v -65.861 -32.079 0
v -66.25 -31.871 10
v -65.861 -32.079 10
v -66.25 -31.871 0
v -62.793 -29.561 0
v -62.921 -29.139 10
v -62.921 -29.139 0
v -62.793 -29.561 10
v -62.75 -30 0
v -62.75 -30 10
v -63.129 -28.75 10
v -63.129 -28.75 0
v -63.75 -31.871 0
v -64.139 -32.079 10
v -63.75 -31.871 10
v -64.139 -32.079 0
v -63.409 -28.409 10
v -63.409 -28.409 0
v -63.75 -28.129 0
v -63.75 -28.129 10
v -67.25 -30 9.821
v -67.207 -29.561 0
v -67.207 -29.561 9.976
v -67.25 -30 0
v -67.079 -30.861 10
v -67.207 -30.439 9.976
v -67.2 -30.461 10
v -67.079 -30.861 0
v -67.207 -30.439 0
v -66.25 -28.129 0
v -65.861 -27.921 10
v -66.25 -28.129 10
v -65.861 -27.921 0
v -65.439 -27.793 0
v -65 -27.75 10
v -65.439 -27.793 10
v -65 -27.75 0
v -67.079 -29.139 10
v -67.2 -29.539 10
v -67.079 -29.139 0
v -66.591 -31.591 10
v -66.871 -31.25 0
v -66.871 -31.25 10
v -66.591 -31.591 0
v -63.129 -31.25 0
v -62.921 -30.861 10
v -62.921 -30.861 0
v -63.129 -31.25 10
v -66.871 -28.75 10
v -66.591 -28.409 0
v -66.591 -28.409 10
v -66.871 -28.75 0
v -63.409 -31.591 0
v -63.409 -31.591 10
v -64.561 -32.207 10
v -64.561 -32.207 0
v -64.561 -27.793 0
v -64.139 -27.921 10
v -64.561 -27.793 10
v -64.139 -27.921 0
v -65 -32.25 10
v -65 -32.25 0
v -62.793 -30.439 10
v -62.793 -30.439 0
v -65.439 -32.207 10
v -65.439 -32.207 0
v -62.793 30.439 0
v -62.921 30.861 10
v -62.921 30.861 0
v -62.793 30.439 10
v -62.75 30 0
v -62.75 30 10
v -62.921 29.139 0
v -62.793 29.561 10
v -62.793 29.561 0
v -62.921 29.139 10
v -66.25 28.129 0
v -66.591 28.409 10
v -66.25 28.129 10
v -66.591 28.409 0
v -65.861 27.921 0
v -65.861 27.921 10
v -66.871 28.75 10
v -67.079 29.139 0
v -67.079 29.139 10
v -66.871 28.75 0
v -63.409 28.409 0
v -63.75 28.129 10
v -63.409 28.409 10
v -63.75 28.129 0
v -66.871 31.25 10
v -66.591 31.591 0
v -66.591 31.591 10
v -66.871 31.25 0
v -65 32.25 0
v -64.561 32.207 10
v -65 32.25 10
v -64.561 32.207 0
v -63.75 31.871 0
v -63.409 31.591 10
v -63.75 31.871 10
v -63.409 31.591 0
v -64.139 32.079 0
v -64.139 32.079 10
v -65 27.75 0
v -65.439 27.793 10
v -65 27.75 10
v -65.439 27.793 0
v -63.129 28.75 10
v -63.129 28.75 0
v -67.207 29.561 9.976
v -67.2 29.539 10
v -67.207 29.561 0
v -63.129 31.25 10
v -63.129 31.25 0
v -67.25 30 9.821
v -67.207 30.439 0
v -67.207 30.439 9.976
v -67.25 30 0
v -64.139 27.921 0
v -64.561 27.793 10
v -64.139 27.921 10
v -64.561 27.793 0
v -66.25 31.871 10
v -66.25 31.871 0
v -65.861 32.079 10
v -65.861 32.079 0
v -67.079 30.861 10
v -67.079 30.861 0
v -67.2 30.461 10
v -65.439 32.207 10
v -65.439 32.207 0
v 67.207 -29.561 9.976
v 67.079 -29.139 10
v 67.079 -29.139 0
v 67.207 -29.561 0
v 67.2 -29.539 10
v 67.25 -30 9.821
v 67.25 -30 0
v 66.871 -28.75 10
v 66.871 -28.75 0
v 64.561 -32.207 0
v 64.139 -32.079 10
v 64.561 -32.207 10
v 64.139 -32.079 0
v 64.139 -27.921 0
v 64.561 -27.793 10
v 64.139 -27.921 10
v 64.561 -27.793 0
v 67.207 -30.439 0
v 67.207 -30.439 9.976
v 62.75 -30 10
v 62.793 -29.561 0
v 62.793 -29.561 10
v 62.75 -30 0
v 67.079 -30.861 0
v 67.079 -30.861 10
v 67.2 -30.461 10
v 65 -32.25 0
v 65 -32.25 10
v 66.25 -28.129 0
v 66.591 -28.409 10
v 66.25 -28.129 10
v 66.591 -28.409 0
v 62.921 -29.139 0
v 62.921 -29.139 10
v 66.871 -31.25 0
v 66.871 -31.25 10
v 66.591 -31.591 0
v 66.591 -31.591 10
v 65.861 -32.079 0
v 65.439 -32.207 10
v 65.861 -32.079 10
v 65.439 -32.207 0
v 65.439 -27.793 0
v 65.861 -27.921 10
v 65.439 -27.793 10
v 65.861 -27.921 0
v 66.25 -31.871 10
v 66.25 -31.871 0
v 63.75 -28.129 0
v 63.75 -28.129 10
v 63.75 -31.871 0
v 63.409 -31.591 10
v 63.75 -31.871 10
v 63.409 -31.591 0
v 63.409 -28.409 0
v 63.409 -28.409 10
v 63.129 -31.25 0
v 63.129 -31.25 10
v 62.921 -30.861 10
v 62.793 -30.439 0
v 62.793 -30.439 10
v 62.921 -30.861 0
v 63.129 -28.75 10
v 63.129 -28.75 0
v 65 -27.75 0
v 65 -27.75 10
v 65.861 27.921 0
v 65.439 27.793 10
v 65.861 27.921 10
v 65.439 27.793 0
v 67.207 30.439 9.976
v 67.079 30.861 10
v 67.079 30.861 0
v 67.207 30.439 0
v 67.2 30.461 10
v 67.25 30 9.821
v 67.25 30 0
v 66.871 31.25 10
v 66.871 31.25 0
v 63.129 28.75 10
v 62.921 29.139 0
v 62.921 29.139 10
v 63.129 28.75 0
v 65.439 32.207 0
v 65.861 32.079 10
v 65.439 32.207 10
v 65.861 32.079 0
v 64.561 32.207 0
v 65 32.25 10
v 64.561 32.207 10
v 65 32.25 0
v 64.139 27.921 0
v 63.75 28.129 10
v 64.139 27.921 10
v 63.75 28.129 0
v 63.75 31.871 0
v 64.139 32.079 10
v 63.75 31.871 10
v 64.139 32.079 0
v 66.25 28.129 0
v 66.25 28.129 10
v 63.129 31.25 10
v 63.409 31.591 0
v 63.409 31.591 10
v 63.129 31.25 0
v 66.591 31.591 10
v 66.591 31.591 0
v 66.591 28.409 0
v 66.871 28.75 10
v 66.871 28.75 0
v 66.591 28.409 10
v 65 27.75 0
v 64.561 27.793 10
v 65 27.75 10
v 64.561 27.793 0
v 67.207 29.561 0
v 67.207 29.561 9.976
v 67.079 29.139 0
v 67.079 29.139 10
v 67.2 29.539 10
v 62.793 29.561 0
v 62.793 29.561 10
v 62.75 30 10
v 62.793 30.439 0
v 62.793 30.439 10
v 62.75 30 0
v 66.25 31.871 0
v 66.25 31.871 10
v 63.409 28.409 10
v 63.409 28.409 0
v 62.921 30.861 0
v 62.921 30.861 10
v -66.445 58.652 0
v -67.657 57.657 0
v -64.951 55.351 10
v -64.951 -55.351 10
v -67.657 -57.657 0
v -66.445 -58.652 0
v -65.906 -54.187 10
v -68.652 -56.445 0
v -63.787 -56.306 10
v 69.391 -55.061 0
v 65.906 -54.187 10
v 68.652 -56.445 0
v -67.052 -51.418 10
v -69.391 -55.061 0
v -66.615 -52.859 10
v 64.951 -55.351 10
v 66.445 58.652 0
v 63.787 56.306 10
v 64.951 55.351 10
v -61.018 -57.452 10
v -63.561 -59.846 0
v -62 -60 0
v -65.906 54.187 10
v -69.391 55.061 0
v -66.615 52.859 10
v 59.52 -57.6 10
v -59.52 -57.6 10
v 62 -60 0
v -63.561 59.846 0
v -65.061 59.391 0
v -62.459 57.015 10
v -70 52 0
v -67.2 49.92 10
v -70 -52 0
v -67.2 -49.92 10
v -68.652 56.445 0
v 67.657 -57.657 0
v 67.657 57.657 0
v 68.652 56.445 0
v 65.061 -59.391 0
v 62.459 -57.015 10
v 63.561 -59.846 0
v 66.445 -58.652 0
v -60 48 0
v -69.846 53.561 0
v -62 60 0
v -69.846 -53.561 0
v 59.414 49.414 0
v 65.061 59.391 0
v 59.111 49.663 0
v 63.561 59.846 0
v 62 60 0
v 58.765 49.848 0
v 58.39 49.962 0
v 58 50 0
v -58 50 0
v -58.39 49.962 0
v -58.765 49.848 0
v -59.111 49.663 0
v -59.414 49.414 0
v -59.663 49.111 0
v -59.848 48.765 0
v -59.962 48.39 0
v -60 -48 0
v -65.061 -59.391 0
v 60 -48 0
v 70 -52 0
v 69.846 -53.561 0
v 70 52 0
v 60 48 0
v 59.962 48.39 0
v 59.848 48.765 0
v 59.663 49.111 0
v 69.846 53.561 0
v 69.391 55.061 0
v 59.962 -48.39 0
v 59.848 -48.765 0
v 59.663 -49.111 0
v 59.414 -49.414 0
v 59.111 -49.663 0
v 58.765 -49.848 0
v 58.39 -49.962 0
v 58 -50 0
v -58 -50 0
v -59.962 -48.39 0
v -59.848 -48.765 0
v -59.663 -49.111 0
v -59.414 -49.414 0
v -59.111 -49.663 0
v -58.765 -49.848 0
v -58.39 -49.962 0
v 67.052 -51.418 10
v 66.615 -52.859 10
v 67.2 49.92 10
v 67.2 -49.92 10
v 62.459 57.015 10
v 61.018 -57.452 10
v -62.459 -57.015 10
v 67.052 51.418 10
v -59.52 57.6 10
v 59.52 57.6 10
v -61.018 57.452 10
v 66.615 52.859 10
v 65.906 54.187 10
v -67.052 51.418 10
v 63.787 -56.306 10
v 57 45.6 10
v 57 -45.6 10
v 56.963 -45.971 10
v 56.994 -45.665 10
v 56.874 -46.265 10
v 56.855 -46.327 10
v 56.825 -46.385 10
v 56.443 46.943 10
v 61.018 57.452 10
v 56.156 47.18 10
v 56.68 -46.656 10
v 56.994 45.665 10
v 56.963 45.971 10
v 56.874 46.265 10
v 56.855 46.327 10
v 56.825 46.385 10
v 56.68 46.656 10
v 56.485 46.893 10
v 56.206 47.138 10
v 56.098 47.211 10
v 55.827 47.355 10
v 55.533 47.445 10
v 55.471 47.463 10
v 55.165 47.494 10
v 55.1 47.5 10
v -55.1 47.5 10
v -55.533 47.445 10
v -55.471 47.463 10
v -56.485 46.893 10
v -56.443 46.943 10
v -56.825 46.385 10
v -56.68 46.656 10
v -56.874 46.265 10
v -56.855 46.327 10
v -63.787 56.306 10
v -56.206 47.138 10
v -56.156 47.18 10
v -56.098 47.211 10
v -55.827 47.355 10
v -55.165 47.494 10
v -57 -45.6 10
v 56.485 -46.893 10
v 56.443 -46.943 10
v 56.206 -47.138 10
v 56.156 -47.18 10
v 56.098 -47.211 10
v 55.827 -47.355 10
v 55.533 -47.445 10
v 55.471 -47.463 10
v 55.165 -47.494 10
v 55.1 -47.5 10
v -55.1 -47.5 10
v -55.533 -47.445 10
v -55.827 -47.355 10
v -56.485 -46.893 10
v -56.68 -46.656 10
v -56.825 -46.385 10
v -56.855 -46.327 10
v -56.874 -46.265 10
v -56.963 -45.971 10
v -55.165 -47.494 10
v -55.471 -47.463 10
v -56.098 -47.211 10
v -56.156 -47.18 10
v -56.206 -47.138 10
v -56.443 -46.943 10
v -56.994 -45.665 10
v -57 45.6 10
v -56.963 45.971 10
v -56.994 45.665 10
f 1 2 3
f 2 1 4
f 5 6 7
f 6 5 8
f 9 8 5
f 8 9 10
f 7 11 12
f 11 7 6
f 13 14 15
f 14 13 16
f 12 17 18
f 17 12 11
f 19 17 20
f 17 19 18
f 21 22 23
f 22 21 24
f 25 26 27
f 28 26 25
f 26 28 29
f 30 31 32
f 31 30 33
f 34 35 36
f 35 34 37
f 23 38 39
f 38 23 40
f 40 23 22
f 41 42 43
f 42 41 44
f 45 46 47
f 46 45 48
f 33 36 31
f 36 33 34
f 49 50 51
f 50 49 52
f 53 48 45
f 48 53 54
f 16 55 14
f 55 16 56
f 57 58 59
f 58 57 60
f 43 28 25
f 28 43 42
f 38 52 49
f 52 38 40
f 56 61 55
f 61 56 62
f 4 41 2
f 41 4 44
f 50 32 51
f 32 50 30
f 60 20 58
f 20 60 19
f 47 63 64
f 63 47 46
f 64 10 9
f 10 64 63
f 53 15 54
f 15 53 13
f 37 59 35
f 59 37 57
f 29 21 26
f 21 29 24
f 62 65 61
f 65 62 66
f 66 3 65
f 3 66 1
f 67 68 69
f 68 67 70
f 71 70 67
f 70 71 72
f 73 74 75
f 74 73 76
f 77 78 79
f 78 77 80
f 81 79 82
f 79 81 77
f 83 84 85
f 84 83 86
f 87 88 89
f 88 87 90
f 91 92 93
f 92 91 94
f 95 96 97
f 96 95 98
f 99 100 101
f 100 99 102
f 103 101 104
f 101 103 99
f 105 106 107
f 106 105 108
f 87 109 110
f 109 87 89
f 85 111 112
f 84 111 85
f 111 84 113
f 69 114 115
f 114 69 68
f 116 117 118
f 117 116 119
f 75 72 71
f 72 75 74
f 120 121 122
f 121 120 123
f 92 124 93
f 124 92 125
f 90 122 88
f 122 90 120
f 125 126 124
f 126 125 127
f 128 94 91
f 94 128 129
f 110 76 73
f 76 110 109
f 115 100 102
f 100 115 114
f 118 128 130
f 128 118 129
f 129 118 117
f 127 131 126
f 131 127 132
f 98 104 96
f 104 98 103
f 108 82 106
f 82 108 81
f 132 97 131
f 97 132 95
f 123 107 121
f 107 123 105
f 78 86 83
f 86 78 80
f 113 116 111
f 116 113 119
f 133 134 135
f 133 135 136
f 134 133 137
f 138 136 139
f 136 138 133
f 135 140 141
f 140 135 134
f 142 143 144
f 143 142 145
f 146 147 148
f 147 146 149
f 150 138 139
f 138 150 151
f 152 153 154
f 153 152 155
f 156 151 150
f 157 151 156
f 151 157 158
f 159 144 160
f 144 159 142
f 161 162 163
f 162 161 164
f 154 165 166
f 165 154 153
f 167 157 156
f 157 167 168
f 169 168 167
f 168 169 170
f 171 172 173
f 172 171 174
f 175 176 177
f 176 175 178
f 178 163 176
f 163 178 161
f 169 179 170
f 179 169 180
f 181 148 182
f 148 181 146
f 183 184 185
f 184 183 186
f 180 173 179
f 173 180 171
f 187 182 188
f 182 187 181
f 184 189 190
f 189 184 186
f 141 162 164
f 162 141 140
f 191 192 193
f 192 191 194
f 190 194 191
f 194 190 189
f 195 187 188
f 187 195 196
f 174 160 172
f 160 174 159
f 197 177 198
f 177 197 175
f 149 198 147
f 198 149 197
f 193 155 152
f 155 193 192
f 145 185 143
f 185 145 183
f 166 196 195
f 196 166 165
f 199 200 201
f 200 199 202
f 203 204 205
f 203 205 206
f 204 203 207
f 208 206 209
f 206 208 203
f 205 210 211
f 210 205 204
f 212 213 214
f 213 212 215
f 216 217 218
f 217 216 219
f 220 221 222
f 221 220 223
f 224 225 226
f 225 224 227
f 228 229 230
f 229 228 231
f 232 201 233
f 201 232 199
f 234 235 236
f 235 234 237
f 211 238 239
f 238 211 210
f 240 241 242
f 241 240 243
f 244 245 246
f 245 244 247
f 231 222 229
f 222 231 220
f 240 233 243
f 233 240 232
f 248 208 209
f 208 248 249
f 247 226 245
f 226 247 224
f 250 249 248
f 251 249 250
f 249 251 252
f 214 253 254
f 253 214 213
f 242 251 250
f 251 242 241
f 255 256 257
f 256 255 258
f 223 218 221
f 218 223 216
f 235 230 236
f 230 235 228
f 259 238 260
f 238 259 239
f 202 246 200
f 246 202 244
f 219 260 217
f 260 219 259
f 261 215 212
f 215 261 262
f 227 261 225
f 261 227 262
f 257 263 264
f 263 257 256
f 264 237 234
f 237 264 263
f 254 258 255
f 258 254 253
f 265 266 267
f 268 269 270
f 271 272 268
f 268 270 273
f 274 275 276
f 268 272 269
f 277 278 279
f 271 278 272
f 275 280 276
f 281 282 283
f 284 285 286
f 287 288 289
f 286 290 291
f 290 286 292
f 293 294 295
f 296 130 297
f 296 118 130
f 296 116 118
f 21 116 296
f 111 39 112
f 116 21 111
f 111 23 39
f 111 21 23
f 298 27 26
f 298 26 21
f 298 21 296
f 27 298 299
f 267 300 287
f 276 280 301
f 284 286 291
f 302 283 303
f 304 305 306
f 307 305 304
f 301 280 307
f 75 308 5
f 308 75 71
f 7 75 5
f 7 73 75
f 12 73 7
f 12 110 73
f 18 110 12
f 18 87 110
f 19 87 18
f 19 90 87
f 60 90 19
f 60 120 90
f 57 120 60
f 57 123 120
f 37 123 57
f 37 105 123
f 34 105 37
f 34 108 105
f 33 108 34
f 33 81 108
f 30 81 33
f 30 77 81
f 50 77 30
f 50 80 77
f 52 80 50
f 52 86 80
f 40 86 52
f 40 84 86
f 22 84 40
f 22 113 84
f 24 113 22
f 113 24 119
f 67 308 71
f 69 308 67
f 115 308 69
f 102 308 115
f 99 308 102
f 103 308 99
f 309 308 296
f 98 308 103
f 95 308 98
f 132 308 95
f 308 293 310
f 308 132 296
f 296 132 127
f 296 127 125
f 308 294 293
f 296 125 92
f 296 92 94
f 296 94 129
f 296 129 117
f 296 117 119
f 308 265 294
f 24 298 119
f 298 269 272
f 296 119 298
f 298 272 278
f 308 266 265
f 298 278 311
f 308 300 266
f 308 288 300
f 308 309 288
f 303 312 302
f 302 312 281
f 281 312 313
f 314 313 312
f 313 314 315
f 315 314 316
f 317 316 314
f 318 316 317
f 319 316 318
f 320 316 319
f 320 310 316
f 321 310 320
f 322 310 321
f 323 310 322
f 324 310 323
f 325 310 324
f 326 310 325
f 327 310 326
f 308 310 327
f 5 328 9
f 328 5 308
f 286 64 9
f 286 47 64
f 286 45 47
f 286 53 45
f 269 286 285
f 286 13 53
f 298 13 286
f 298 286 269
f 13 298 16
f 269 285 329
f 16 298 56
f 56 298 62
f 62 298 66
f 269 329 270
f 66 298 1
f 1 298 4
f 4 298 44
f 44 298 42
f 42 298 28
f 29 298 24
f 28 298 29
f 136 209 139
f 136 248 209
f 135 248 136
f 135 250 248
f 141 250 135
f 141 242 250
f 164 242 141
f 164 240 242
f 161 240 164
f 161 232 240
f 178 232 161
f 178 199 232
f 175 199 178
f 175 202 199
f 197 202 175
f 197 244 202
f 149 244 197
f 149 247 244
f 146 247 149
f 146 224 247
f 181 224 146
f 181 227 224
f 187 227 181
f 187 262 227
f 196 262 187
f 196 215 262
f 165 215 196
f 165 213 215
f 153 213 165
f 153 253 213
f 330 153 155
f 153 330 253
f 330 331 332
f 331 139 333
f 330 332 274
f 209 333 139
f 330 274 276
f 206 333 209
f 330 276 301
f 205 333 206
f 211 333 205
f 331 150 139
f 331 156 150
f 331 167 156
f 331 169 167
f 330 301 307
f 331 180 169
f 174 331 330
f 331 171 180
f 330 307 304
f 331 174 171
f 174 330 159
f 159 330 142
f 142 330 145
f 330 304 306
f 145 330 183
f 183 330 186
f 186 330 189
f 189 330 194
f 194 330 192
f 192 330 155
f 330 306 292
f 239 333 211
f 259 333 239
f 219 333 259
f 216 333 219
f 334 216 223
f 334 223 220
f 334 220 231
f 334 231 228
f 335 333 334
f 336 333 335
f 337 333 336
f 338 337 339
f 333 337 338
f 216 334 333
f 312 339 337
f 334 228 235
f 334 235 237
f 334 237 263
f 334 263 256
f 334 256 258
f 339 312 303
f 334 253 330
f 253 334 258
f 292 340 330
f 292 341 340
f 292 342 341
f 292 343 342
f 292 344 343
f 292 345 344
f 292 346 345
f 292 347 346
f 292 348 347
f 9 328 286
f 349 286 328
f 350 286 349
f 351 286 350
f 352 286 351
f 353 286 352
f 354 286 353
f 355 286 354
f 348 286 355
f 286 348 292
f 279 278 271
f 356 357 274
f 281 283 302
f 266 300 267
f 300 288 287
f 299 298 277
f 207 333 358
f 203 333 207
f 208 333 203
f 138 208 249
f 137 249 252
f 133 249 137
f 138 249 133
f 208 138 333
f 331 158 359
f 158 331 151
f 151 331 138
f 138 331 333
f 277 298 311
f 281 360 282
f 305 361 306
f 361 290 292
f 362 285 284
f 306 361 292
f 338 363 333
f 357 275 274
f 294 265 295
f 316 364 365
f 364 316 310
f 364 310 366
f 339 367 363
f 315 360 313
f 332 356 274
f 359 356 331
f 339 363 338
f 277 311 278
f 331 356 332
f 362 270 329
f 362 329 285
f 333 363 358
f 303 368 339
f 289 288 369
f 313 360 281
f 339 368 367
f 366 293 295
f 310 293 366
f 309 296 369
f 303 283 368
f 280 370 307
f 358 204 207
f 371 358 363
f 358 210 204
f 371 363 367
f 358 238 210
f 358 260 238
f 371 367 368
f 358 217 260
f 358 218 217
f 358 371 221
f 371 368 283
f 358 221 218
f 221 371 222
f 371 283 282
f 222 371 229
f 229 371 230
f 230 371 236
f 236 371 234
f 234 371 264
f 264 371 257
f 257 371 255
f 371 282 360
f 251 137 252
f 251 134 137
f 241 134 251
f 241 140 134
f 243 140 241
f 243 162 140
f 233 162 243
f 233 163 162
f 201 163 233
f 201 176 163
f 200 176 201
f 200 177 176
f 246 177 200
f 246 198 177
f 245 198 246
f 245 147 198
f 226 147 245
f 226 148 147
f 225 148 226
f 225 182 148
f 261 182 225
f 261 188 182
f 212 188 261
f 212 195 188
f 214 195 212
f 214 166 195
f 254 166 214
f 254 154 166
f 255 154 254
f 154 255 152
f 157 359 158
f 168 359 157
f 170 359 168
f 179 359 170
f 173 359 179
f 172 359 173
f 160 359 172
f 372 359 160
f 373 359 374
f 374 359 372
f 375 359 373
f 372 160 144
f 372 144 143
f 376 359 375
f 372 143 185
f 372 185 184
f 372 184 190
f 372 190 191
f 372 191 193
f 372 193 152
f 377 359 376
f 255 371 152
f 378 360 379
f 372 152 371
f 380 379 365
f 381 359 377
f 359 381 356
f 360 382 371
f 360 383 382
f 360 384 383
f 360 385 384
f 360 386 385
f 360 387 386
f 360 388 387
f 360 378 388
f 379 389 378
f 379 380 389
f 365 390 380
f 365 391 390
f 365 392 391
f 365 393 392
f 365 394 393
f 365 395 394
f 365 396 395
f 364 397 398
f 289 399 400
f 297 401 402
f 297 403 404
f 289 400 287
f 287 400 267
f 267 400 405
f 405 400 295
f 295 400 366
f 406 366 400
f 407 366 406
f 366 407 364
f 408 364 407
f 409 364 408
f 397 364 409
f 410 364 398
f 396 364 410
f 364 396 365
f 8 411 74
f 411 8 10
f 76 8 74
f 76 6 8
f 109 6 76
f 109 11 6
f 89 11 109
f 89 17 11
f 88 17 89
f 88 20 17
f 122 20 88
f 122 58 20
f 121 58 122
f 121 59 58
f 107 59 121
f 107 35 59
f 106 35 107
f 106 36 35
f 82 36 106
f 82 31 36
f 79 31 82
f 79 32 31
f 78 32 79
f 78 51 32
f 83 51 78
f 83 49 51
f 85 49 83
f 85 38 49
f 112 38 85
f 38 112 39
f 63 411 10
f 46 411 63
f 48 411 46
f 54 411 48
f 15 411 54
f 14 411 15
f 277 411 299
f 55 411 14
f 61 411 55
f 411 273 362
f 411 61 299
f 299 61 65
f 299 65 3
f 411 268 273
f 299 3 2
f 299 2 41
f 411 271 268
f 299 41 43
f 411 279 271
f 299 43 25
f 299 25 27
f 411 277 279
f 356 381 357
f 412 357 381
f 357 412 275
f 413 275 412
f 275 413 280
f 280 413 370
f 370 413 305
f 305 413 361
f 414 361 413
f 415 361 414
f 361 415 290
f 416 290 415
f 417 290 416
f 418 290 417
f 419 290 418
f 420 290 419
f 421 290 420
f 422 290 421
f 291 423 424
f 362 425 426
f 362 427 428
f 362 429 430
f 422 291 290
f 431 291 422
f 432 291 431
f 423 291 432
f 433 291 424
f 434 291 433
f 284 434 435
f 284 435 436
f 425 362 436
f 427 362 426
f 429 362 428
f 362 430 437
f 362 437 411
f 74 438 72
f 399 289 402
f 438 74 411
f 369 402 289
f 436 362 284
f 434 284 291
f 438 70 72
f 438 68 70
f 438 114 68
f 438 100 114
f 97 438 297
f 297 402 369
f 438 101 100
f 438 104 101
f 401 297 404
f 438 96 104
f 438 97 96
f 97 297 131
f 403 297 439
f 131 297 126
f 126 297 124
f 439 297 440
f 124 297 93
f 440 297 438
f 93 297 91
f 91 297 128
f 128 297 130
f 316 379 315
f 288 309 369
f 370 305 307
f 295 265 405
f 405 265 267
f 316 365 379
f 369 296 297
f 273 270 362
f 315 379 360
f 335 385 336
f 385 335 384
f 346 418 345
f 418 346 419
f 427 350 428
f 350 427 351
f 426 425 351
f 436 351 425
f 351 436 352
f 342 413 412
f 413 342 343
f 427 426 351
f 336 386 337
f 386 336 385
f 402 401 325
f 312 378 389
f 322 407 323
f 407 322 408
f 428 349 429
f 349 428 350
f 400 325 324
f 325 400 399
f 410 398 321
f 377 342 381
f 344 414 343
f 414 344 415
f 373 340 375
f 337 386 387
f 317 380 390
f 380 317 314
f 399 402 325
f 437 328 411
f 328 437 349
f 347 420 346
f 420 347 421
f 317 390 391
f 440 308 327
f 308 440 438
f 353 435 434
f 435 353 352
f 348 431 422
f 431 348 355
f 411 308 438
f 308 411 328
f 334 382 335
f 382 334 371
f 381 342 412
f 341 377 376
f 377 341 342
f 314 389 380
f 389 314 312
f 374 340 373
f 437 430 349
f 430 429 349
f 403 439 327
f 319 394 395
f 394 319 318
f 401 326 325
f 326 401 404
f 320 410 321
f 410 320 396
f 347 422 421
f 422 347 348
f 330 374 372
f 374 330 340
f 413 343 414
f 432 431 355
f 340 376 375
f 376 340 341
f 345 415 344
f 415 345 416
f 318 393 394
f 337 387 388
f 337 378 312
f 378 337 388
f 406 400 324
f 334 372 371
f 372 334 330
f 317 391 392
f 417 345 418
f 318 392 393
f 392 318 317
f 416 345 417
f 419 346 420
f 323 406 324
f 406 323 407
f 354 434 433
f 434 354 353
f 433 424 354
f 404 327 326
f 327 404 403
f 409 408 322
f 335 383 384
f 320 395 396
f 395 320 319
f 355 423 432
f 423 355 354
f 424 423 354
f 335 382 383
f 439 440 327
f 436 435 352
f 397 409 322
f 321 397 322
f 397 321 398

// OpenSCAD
$fn = 32;

// ----------------------------------------------------------------------
// Display bezel: 140 x 120 mm frame, opening 120x100 mm
// ----------------------------------------------------------------------

// --- parameters (mm) ---
length = 140;             // frame outside length, X
width = 120;              // frame outside width, Y
frame_w = 10;             // frame width
thickness = 10;           // frame thickness
corner_r = 8;             // outside corner radius
chamfer = 0.96;           // outer wall taper
funnel = 0.94;            // inner opening taper
opening_l = 120;          // opening length
opening_w = 100;          // opening width
inner_r = 2;              // opening corner radius
hole_d = 4.5;             // mounting screw clearance
holes_per_side = 2;       // holes per short side
hole_inset = 5;           // hole centre inset from the outside edge

/* rounded-rectangle outlines, generated with loops */
module rounded_ring(l_nom, w_nom, r) {
  hull() {
    for (sx = [-1, 1]) for (sy = [-1, 1])
      translate([sx * (l_nom / 2 - r), sy * (w_nom / 2 - r)]) circle(r = r);
  }
}

difference() {
  /* frame body, drafted so the outer edge is a variable-depth chamfer */
  linear_extrude(height = thickness, scale = chamfer)
    rounded_ring(length, width, corner_r);
  /* viewing opening, drafted the other way for a funnel edge */
  linear_extrude(height = thickness + 2, scale = funnel)
    translate([0, 0, -1]) rounded_ring(opening_l, opening_w, inner_r);
  /* mounting screws through the frame lands */
  for (sx = [-1, 1]) for (i = [1 : holes_per_side])
    translate([sx * (length / 2 - hole_inset),
               (i - (holes_per_side + 1) / 2) * width * 0.5, -1])
      cylinder(h = thickness + 2, d = hole_d);
}
